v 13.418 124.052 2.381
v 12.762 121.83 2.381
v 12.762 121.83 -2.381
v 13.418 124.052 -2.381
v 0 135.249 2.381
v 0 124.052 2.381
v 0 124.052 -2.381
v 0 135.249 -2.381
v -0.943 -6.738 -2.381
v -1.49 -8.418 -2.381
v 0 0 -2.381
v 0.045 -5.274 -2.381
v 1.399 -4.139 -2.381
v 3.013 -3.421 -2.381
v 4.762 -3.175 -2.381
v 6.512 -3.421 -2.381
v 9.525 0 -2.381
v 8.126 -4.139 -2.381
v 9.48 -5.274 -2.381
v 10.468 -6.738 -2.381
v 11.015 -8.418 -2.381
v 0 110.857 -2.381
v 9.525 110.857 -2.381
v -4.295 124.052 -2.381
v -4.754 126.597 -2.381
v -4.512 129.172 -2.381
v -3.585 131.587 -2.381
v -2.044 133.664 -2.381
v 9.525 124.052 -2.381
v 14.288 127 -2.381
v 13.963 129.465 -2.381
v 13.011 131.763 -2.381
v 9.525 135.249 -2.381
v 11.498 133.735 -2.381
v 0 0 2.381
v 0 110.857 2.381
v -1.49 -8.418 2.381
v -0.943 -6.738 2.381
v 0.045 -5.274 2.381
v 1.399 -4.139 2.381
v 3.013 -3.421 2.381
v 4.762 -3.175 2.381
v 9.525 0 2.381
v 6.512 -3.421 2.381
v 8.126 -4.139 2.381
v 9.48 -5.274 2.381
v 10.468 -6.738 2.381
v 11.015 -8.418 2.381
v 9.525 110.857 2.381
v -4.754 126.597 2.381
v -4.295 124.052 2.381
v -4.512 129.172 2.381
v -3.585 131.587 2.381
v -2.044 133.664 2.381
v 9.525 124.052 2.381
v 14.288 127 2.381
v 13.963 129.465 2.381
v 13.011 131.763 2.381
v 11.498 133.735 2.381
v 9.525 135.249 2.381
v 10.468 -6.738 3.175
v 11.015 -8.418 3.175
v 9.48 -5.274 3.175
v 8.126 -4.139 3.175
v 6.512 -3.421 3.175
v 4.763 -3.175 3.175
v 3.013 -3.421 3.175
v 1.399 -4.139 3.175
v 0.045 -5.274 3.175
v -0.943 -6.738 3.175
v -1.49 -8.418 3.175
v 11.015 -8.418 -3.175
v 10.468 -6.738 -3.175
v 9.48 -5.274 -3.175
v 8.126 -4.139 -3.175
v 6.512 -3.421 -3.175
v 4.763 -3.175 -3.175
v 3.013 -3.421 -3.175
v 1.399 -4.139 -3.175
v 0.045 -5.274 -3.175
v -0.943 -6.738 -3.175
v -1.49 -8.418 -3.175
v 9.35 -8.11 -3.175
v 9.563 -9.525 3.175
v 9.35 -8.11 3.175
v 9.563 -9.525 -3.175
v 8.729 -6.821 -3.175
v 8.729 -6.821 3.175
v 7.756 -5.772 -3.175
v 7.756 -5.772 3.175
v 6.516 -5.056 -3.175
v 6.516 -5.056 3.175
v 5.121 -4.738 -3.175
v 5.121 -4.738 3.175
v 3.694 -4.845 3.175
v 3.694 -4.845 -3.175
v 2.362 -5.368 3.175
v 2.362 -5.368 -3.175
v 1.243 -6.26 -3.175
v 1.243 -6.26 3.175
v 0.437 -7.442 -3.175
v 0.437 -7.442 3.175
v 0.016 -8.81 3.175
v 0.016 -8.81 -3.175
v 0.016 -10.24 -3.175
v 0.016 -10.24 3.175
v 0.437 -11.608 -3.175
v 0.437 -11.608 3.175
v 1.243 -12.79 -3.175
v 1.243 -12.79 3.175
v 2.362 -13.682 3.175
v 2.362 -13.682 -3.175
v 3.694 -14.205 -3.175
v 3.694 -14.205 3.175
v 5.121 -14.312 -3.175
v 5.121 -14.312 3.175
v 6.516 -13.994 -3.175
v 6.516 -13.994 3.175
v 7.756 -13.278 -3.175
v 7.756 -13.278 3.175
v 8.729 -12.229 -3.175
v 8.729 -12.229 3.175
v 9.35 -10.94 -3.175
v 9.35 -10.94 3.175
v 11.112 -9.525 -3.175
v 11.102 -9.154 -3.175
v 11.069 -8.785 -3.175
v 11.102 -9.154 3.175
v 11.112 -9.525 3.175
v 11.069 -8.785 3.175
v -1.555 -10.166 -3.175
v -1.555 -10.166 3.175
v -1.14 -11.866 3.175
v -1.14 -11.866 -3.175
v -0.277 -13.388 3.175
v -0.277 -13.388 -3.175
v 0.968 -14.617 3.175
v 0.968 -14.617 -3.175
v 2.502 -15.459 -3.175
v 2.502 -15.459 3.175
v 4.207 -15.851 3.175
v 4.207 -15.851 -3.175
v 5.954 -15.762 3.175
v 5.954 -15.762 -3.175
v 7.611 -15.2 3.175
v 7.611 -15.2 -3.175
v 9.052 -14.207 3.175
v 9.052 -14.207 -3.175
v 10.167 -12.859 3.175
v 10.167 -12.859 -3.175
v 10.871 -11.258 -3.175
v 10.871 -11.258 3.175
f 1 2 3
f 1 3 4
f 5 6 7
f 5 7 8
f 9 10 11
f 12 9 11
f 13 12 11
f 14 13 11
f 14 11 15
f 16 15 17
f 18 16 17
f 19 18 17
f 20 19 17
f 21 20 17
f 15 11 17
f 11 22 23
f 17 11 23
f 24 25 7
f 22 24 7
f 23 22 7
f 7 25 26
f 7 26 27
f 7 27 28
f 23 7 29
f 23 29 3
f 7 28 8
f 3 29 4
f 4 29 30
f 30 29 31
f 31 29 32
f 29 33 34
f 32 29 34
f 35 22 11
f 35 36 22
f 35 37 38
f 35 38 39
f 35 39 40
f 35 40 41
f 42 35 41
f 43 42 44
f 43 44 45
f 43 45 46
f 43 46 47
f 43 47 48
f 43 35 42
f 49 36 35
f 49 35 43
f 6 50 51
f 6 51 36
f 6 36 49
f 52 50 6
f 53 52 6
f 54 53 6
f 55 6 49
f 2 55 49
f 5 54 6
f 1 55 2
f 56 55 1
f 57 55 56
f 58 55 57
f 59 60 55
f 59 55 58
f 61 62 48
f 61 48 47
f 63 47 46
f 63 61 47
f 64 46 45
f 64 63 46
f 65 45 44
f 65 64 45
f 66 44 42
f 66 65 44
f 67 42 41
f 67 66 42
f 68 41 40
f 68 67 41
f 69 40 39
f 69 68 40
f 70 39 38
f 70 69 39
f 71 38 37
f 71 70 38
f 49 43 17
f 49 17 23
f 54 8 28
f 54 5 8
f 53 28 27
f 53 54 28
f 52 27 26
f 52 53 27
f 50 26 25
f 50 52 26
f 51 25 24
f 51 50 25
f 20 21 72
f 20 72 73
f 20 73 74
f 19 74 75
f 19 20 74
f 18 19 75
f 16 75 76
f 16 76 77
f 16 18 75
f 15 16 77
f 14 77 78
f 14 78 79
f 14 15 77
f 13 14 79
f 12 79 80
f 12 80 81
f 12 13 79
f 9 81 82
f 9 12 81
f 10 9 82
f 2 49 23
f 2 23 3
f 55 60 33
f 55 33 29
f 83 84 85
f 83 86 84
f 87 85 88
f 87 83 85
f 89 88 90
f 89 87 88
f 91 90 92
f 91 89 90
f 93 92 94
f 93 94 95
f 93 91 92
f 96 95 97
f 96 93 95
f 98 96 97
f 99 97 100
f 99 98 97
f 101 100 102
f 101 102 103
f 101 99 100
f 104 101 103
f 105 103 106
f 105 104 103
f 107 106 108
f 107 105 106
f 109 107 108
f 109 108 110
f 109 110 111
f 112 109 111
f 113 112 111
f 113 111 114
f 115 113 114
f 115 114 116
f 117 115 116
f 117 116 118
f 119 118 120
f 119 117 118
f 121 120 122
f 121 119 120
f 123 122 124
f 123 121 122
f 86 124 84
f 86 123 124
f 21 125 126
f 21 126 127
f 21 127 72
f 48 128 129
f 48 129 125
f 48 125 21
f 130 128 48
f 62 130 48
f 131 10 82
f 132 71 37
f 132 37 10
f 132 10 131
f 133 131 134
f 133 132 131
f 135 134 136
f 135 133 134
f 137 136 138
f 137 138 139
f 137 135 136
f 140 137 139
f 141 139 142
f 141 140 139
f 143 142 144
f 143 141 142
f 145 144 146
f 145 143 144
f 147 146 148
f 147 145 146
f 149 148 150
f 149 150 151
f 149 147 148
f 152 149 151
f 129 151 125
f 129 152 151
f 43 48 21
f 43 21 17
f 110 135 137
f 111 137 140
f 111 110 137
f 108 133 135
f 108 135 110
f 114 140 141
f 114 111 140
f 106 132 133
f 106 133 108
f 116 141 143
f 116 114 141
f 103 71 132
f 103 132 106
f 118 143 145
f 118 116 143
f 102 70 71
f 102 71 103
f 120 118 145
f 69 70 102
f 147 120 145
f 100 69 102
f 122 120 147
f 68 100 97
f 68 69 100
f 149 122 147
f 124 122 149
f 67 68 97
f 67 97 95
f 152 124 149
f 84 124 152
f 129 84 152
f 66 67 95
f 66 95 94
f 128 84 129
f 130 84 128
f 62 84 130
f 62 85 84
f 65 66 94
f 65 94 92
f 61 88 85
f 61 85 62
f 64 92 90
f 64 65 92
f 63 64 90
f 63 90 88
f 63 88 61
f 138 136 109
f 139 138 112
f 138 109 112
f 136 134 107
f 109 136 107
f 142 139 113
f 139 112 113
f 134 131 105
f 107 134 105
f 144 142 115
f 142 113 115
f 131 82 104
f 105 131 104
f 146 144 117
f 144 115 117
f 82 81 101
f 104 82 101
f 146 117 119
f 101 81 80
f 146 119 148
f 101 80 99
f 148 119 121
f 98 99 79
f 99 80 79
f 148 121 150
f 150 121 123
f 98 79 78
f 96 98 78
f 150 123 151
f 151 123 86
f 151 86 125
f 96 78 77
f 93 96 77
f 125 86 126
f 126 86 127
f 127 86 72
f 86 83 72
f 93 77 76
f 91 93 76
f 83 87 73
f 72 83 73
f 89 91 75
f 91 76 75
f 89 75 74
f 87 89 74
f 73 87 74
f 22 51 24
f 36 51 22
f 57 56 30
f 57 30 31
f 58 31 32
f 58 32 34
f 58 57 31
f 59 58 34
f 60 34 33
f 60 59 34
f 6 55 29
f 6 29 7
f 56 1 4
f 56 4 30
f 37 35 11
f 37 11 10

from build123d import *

# Parameters (mm, degrees)
F1_DEPTH = 1.5875
F2_DEPTH = 2.38125
F0_R     = 4.8006
F3_DEPTH = 3.175


with BuildPart() as f1:
    # F0 (on Top) → F1 (new body, symmetric)
    with BuildSketch(Plane.XY):
        with BuildLine():
            Line((0, 110.85698), (0, 0))
            Line((0, 0), (-1.490273, -8.418053))
            ThreePointArc((-1.490273, -8.418053), (4.7625, -3.175), (11.015273, -8.418053))
            Line((11.015273, -8.418053), (9.525, 0))
            Line((9.525, 0), (9.525, 110.85698))
            Line((9.525, 110.85698), (12.762214, 121.829874))
            Line((12.762214, 121.829874), (13.417772, 124.051962))
            Line((13.417772, 124.051962), (14.2875, 127))
            ThreePointArc((14.2875, 127), (13.011392, 131.7625), (9.525, 135.248892))
            Line((9.525, 135.248892), (9.525, 124.051962))
            Line((9.525, 124.051962), (0, 124.051962))
            Line((0, 124.051962), (0, 135.248892))
            ThreePointArc((0, 135.248892), (-4.13073, 130.411172), (-4.294801, 124.051962))
            Line((-4.294801, 124.051962), (0, 110.85698))
        make_face()
    extrude(amount=F1_DEPTH, both=True)

    # F0 (on Top) → F2 (join, symmetric)
    with BuildSketch(Plane.XY):
        with BuildLine():
            Line((0, 110.85698), (0, 0))
            Line((0, 0), (-1.490273, -8.418053))
            ThreePointArc((-1.490273, -8.418053), (4.7625, -3.175), (11.015273, -8.418053))
            Line((11.015273, -8.418053), (9.525, 0))
            Line((9.525, 0), (9.525, 110.85698))
            Line((9.525, 110.85698), (12.762214, 121.829874))
            Line((12.762214, 121.829874), (13.417772, 124.051962))
            Line((13.417772, 124.051962), (14.2875, 127))
            ThreePointArc((14.2875, 127), (13.011392, 131.7625), (9.525, 135.248892))
            Line((9.525, 135.248892), (9.525, 124.051962))
            Line((9.525, 124.051962), (0, 124.051962))
            Line((0, 124.051962), (0, 135.248892))
            ThreePointArc((0, 135.248892), (-4.13073, 130.411172), (-4.294801, 124.051962))
            Line((-4.294801, 124.051962), (0, 110.85698))
        make_face()
    extrude(amount=F2_DEPTH, both=True)

    # F0 (on Top) → F3 (join, symmetric)
    with BuildSketch(Plane.XY):
        with BuildLine():
            ThreePointArc((11.015273, -8.418053), (4.7625, -3.175), (-1.490273, -8.418053))
            ThreePointArc((-1.490273, -8.418053), (4.206896, -15.850647), (11.1125, -9.525))
            ThreePointArc((11.1125, -9.525), (11.088147, -8.969396), (11.015273, -8.418053))
        make_face()
        with Locations((4.7625, -9.525)):
            Circle(F0_R, mode=Mode.SUBTRACT)
    extrude(amount=F3_DEPTH, both=True)


solid = f1.part
